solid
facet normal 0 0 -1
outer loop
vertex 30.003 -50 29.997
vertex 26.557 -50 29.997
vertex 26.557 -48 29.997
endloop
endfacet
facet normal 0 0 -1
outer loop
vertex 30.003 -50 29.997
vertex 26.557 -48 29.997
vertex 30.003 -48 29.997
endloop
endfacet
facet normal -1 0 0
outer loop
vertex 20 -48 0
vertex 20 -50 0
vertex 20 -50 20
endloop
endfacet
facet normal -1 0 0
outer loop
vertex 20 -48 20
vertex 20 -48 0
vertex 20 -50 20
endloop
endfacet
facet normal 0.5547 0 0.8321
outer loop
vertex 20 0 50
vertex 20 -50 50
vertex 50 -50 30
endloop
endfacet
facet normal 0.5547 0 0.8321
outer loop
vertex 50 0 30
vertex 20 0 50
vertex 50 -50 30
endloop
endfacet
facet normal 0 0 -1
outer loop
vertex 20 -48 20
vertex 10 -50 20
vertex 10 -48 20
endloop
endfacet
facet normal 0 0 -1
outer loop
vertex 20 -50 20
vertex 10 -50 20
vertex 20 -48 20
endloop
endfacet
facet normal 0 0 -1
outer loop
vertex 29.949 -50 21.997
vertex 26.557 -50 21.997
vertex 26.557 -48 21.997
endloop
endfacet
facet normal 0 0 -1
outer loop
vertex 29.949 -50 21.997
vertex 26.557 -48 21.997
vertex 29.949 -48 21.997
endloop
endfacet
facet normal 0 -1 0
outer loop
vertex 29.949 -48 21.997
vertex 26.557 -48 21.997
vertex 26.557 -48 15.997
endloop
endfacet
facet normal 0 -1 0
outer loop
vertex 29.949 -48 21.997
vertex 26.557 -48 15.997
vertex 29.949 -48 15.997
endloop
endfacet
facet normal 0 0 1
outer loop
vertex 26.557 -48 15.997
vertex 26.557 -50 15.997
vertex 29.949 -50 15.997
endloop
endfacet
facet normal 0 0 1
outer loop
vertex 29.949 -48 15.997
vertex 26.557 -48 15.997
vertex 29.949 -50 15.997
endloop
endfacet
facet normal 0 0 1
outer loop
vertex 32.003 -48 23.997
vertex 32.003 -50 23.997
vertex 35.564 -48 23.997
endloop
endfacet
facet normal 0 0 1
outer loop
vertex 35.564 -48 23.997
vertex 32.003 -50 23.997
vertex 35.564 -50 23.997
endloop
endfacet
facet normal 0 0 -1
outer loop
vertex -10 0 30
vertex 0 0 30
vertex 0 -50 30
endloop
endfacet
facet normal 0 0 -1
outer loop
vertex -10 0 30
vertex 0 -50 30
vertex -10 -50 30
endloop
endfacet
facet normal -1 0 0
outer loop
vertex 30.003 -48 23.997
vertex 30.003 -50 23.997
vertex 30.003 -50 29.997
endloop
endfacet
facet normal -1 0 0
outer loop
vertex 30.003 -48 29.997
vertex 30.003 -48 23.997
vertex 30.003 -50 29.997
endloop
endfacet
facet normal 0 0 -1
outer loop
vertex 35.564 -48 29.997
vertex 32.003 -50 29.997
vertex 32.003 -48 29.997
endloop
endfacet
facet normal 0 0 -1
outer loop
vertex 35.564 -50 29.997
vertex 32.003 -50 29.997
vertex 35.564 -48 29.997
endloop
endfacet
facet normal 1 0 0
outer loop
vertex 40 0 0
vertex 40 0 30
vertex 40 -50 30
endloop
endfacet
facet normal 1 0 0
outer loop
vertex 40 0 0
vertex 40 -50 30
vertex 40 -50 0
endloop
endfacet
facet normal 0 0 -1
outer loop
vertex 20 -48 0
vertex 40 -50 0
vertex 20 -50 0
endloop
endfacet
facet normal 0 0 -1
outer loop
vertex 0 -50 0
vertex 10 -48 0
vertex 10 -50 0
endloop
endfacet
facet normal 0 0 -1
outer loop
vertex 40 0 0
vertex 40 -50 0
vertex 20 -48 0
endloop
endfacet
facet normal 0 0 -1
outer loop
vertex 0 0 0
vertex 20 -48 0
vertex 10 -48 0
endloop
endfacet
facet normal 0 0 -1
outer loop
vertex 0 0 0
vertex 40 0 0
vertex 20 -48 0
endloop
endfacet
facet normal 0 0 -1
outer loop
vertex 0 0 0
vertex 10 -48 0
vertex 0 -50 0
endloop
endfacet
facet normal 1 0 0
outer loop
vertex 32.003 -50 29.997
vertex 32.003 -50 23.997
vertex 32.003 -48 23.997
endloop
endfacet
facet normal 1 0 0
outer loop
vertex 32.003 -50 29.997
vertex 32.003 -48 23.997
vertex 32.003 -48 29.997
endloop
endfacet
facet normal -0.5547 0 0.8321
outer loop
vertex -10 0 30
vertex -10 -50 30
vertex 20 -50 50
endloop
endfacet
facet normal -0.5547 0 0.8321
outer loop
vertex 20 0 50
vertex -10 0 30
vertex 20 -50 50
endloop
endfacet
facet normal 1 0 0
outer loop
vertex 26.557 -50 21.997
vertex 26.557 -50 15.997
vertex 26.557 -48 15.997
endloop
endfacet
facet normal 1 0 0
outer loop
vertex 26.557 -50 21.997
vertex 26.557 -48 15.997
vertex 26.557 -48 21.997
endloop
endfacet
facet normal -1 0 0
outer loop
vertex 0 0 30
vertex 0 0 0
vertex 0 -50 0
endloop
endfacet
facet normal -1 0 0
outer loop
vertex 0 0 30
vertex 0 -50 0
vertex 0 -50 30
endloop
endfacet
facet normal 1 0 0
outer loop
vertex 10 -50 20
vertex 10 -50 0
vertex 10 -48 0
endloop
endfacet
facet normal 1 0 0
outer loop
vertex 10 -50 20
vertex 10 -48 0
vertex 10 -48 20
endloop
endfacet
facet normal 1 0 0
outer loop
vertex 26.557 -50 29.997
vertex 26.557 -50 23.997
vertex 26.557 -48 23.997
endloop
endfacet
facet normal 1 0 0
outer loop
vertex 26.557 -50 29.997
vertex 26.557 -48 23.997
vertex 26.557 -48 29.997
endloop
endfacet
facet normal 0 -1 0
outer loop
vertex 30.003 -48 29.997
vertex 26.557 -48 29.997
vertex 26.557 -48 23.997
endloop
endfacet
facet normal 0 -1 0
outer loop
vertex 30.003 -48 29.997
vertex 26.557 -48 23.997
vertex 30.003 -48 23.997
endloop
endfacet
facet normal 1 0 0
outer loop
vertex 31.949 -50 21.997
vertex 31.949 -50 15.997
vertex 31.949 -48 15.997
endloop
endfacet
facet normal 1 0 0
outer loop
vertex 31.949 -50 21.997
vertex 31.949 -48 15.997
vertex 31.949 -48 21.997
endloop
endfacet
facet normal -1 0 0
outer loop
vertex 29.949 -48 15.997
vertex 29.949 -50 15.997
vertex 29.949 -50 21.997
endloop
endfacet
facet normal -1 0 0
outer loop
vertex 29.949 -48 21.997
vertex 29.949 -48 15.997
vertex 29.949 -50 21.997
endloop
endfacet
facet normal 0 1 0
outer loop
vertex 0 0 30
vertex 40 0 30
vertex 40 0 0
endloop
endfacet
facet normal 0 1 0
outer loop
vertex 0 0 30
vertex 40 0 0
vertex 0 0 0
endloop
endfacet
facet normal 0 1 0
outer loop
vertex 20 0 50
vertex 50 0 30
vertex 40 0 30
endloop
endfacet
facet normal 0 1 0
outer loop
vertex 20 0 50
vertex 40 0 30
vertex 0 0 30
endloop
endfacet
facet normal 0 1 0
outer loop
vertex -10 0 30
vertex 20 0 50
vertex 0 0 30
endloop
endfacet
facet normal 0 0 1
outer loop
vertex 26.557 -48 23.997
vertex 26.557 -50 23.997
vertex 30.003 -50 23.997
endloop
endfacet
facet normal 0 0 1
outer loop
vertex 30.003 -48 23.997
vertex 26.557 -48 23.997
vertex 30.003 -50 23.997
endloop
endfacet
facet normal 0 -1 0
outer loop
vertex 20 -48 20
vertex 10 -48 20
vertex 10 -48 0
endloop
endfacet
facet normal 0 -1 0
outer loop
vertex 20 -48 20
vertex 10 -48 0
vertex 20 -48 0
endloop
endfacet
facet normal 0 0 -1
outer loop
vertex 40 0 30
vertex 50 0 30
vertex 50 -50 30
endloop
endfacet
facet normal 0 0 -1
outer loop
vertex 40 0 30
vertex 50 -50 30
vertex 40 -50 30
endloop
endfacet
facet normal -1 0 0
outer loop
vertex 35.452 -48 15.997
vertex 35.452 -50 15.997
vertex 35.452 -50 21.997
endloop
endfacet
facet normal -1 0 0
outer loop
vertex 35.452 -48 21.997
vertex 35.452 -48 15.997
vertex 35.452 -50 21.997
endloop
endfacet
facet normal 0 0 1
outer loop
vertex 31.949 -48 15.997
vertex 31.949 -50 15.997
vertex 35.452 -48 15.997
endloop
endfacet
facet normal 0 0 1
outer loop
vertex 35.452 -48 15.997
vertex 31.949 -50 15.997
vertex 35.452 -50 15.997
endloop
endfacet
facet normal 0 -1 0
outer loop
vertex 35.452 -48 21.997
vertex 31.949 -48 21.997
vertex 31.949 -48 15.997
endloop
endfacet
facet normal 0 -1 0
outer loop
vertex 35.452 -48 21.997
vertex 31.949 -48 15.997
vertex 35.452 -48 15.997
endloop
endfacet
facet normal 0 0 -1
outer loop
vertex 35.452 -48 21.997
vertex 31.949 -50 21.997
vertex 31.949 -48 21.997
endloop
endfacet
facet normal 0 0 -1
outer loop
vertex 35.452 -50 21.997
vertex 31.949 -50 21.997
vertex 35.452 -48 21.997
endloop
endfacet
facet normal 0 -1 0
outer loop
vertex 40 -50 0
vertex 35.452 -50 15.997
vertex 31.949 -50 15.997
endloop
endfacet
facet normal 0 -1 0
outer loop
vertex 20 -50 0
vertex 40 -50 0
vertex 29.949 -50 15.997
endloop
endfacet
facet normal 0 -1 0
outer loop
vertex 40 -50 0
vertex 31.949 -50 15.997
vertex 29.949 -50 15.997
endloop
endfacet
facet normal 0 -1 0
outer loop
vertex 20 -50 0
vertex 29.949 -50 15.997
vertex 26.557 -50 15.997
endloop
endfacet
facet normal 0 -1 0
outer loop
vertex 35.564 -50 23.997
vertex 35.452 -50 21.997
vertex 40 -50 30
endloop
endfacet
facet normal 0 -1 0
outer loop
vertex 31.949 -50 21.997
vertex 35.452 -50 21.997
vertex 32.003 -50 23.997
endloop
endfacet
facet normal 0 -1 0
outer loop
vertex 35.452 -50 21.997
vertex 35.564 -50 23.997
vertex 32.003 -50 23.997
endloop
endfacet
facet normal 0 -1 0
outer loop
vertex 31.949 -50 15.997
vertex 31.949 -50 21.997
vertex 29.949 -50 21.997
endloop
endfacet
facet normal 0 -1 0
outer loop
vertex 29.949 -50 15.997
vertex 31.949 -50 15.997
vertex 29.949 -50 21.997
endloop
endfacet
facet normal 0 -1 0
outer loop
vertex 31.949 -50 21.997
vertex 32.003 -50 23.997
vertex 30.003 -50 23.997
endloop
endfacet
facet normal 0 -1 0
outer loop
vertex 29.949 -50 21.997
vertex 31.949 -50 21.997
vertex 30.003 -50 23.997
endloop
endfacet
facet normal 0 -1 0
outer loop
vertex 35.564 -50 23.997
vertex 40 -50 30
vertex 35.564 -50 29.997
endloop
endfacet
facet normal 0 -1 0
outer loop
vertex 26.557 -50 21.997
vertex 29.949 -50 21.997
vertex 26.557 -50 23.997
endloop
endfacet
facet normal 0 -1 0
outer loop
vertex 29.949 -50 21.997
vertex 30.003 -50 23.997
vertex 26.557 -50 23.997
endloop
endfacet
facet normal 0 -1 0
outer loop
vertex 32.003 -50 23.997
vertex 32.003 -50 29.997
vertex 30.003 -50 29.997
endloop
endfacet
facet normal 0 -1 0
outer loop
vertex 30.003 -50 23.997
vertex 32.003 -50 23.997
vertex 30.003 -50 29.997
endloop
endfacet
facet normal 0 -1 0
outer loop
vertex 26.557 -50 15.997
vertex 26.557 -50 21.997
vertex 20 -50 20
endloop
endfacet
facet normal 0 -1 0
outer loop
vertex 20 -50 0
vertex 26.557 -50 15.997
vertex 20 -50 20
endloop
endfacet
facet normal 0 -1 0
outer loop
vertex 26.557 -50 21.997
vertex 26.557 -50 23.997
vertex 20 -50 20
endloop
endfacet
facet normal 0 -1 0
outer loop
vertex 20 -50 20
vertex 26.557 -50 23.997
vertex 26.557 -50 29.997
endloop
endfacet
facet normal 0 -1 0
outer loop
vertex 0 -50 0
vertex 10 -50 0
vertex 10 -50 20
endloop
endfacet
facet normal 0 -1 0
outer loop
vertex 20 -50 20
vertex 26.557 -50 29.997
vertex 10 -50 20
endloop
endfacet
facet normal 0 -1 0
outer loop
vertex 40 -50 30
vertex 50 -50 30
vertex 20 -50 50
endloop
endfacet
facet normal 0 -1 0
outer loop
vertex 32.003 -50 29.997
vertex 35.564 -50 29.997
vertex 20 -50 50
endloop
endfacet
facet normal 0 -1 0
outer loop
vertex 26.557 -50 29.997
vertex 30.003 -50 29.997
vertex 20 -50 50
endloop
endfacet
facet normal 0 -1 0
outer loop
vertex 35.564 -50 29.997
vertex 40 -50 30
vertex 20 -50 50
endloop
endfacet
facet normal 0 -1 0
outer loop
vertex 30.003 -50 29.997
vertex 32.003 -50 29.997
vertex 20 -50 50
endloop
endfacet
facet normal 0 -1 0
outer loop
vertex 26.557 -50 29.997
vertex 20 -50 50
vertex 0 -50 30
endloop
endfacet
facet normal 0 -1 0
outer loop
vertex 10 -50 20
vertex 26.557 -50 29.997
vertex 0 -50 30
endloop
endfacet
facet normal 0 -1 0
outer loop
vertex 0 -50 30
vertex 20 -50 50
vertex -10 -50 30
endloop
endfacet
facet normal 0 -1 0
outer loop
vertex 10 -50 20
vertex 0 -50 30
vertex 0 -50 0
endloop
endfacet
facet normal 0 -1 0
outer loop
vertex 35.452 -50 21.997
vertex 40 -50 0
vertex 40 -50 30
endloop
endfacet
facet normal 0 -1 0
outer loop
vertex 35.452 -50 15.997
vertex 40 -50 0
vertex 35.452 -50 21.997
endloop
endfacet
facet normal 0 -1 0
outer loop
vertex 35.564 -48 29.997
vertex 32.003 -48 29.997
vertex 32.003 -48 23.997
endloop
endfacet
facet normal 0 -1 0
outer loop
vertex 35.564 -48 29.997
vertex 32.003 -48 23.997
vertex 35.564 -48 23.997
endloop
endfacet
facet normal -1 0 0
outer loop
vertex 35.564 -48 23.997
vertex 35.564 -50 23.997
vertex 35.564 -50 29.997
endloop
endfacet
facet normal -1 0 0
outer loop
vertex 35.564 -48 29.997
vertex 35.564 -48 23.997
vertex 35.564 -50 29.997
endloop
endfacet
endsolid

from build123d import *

# Parameters (mm, degrees)
PAD_DEPTH       = 50
SKETCH001_W     = 10
SKETCH001_H     = 20
POCKET_DEPTH    = 2
SKETCH002_W     = 3.446111
SKETCH002_H     = 6
SKETCH002_W_2   = 3.56074
SKETCH002_W_3   = 3.39247
SKETCH002_W_4   = 3.502147
POCKET001_DEPTH = 2


with BuildPart() as part:
    # Sketch → Pad (new body)
    with BuildSketch(Plane.XZ):
        Polygon((0, 0), (0, 30), (-10, 30), (20, 50), (50, 30), (40, 30), (40, 0), align=None)
    extrude(amount=PAD_DEPTH)

    # Sketch001 (on Face9 of Pad) → Pocket (cut)
    with BuildSketch(Plane.XZ.offset(50)):
        with Locations((15, 10)):
            Rectangle(SKETCH001_W, SKETCH001_H)
    extrude(amount=-POCKET_DEPTH, mode=Mode.SUBTRACT)

    # Sketch002 (on Face5 of Pocket) → Pocket001 (cut)
    with BuildSketch(Plane.XZ.offset(50)):
        with Locations((28.280043, 26.997097)):
            Rectangle(SKETCH002_W, SKETCH002_H)
        with Locations((33.783469, 26.997097)):
            Rectangle(SKETCH002_W_2, SKETCH002_H)
        with Locations((28.253223, 18.997097)):
            Rectangle(SKETCH002_W_3, SKETCH002_H)
        with Locations((33.700531, 18.997097)):
            Rectangle(SKETCH002_W_4, SKETCH002_H)
    extrude(amount=-POCKET001_DEPTH, mode=Mode.SUBTRACT)


solid = part.part
